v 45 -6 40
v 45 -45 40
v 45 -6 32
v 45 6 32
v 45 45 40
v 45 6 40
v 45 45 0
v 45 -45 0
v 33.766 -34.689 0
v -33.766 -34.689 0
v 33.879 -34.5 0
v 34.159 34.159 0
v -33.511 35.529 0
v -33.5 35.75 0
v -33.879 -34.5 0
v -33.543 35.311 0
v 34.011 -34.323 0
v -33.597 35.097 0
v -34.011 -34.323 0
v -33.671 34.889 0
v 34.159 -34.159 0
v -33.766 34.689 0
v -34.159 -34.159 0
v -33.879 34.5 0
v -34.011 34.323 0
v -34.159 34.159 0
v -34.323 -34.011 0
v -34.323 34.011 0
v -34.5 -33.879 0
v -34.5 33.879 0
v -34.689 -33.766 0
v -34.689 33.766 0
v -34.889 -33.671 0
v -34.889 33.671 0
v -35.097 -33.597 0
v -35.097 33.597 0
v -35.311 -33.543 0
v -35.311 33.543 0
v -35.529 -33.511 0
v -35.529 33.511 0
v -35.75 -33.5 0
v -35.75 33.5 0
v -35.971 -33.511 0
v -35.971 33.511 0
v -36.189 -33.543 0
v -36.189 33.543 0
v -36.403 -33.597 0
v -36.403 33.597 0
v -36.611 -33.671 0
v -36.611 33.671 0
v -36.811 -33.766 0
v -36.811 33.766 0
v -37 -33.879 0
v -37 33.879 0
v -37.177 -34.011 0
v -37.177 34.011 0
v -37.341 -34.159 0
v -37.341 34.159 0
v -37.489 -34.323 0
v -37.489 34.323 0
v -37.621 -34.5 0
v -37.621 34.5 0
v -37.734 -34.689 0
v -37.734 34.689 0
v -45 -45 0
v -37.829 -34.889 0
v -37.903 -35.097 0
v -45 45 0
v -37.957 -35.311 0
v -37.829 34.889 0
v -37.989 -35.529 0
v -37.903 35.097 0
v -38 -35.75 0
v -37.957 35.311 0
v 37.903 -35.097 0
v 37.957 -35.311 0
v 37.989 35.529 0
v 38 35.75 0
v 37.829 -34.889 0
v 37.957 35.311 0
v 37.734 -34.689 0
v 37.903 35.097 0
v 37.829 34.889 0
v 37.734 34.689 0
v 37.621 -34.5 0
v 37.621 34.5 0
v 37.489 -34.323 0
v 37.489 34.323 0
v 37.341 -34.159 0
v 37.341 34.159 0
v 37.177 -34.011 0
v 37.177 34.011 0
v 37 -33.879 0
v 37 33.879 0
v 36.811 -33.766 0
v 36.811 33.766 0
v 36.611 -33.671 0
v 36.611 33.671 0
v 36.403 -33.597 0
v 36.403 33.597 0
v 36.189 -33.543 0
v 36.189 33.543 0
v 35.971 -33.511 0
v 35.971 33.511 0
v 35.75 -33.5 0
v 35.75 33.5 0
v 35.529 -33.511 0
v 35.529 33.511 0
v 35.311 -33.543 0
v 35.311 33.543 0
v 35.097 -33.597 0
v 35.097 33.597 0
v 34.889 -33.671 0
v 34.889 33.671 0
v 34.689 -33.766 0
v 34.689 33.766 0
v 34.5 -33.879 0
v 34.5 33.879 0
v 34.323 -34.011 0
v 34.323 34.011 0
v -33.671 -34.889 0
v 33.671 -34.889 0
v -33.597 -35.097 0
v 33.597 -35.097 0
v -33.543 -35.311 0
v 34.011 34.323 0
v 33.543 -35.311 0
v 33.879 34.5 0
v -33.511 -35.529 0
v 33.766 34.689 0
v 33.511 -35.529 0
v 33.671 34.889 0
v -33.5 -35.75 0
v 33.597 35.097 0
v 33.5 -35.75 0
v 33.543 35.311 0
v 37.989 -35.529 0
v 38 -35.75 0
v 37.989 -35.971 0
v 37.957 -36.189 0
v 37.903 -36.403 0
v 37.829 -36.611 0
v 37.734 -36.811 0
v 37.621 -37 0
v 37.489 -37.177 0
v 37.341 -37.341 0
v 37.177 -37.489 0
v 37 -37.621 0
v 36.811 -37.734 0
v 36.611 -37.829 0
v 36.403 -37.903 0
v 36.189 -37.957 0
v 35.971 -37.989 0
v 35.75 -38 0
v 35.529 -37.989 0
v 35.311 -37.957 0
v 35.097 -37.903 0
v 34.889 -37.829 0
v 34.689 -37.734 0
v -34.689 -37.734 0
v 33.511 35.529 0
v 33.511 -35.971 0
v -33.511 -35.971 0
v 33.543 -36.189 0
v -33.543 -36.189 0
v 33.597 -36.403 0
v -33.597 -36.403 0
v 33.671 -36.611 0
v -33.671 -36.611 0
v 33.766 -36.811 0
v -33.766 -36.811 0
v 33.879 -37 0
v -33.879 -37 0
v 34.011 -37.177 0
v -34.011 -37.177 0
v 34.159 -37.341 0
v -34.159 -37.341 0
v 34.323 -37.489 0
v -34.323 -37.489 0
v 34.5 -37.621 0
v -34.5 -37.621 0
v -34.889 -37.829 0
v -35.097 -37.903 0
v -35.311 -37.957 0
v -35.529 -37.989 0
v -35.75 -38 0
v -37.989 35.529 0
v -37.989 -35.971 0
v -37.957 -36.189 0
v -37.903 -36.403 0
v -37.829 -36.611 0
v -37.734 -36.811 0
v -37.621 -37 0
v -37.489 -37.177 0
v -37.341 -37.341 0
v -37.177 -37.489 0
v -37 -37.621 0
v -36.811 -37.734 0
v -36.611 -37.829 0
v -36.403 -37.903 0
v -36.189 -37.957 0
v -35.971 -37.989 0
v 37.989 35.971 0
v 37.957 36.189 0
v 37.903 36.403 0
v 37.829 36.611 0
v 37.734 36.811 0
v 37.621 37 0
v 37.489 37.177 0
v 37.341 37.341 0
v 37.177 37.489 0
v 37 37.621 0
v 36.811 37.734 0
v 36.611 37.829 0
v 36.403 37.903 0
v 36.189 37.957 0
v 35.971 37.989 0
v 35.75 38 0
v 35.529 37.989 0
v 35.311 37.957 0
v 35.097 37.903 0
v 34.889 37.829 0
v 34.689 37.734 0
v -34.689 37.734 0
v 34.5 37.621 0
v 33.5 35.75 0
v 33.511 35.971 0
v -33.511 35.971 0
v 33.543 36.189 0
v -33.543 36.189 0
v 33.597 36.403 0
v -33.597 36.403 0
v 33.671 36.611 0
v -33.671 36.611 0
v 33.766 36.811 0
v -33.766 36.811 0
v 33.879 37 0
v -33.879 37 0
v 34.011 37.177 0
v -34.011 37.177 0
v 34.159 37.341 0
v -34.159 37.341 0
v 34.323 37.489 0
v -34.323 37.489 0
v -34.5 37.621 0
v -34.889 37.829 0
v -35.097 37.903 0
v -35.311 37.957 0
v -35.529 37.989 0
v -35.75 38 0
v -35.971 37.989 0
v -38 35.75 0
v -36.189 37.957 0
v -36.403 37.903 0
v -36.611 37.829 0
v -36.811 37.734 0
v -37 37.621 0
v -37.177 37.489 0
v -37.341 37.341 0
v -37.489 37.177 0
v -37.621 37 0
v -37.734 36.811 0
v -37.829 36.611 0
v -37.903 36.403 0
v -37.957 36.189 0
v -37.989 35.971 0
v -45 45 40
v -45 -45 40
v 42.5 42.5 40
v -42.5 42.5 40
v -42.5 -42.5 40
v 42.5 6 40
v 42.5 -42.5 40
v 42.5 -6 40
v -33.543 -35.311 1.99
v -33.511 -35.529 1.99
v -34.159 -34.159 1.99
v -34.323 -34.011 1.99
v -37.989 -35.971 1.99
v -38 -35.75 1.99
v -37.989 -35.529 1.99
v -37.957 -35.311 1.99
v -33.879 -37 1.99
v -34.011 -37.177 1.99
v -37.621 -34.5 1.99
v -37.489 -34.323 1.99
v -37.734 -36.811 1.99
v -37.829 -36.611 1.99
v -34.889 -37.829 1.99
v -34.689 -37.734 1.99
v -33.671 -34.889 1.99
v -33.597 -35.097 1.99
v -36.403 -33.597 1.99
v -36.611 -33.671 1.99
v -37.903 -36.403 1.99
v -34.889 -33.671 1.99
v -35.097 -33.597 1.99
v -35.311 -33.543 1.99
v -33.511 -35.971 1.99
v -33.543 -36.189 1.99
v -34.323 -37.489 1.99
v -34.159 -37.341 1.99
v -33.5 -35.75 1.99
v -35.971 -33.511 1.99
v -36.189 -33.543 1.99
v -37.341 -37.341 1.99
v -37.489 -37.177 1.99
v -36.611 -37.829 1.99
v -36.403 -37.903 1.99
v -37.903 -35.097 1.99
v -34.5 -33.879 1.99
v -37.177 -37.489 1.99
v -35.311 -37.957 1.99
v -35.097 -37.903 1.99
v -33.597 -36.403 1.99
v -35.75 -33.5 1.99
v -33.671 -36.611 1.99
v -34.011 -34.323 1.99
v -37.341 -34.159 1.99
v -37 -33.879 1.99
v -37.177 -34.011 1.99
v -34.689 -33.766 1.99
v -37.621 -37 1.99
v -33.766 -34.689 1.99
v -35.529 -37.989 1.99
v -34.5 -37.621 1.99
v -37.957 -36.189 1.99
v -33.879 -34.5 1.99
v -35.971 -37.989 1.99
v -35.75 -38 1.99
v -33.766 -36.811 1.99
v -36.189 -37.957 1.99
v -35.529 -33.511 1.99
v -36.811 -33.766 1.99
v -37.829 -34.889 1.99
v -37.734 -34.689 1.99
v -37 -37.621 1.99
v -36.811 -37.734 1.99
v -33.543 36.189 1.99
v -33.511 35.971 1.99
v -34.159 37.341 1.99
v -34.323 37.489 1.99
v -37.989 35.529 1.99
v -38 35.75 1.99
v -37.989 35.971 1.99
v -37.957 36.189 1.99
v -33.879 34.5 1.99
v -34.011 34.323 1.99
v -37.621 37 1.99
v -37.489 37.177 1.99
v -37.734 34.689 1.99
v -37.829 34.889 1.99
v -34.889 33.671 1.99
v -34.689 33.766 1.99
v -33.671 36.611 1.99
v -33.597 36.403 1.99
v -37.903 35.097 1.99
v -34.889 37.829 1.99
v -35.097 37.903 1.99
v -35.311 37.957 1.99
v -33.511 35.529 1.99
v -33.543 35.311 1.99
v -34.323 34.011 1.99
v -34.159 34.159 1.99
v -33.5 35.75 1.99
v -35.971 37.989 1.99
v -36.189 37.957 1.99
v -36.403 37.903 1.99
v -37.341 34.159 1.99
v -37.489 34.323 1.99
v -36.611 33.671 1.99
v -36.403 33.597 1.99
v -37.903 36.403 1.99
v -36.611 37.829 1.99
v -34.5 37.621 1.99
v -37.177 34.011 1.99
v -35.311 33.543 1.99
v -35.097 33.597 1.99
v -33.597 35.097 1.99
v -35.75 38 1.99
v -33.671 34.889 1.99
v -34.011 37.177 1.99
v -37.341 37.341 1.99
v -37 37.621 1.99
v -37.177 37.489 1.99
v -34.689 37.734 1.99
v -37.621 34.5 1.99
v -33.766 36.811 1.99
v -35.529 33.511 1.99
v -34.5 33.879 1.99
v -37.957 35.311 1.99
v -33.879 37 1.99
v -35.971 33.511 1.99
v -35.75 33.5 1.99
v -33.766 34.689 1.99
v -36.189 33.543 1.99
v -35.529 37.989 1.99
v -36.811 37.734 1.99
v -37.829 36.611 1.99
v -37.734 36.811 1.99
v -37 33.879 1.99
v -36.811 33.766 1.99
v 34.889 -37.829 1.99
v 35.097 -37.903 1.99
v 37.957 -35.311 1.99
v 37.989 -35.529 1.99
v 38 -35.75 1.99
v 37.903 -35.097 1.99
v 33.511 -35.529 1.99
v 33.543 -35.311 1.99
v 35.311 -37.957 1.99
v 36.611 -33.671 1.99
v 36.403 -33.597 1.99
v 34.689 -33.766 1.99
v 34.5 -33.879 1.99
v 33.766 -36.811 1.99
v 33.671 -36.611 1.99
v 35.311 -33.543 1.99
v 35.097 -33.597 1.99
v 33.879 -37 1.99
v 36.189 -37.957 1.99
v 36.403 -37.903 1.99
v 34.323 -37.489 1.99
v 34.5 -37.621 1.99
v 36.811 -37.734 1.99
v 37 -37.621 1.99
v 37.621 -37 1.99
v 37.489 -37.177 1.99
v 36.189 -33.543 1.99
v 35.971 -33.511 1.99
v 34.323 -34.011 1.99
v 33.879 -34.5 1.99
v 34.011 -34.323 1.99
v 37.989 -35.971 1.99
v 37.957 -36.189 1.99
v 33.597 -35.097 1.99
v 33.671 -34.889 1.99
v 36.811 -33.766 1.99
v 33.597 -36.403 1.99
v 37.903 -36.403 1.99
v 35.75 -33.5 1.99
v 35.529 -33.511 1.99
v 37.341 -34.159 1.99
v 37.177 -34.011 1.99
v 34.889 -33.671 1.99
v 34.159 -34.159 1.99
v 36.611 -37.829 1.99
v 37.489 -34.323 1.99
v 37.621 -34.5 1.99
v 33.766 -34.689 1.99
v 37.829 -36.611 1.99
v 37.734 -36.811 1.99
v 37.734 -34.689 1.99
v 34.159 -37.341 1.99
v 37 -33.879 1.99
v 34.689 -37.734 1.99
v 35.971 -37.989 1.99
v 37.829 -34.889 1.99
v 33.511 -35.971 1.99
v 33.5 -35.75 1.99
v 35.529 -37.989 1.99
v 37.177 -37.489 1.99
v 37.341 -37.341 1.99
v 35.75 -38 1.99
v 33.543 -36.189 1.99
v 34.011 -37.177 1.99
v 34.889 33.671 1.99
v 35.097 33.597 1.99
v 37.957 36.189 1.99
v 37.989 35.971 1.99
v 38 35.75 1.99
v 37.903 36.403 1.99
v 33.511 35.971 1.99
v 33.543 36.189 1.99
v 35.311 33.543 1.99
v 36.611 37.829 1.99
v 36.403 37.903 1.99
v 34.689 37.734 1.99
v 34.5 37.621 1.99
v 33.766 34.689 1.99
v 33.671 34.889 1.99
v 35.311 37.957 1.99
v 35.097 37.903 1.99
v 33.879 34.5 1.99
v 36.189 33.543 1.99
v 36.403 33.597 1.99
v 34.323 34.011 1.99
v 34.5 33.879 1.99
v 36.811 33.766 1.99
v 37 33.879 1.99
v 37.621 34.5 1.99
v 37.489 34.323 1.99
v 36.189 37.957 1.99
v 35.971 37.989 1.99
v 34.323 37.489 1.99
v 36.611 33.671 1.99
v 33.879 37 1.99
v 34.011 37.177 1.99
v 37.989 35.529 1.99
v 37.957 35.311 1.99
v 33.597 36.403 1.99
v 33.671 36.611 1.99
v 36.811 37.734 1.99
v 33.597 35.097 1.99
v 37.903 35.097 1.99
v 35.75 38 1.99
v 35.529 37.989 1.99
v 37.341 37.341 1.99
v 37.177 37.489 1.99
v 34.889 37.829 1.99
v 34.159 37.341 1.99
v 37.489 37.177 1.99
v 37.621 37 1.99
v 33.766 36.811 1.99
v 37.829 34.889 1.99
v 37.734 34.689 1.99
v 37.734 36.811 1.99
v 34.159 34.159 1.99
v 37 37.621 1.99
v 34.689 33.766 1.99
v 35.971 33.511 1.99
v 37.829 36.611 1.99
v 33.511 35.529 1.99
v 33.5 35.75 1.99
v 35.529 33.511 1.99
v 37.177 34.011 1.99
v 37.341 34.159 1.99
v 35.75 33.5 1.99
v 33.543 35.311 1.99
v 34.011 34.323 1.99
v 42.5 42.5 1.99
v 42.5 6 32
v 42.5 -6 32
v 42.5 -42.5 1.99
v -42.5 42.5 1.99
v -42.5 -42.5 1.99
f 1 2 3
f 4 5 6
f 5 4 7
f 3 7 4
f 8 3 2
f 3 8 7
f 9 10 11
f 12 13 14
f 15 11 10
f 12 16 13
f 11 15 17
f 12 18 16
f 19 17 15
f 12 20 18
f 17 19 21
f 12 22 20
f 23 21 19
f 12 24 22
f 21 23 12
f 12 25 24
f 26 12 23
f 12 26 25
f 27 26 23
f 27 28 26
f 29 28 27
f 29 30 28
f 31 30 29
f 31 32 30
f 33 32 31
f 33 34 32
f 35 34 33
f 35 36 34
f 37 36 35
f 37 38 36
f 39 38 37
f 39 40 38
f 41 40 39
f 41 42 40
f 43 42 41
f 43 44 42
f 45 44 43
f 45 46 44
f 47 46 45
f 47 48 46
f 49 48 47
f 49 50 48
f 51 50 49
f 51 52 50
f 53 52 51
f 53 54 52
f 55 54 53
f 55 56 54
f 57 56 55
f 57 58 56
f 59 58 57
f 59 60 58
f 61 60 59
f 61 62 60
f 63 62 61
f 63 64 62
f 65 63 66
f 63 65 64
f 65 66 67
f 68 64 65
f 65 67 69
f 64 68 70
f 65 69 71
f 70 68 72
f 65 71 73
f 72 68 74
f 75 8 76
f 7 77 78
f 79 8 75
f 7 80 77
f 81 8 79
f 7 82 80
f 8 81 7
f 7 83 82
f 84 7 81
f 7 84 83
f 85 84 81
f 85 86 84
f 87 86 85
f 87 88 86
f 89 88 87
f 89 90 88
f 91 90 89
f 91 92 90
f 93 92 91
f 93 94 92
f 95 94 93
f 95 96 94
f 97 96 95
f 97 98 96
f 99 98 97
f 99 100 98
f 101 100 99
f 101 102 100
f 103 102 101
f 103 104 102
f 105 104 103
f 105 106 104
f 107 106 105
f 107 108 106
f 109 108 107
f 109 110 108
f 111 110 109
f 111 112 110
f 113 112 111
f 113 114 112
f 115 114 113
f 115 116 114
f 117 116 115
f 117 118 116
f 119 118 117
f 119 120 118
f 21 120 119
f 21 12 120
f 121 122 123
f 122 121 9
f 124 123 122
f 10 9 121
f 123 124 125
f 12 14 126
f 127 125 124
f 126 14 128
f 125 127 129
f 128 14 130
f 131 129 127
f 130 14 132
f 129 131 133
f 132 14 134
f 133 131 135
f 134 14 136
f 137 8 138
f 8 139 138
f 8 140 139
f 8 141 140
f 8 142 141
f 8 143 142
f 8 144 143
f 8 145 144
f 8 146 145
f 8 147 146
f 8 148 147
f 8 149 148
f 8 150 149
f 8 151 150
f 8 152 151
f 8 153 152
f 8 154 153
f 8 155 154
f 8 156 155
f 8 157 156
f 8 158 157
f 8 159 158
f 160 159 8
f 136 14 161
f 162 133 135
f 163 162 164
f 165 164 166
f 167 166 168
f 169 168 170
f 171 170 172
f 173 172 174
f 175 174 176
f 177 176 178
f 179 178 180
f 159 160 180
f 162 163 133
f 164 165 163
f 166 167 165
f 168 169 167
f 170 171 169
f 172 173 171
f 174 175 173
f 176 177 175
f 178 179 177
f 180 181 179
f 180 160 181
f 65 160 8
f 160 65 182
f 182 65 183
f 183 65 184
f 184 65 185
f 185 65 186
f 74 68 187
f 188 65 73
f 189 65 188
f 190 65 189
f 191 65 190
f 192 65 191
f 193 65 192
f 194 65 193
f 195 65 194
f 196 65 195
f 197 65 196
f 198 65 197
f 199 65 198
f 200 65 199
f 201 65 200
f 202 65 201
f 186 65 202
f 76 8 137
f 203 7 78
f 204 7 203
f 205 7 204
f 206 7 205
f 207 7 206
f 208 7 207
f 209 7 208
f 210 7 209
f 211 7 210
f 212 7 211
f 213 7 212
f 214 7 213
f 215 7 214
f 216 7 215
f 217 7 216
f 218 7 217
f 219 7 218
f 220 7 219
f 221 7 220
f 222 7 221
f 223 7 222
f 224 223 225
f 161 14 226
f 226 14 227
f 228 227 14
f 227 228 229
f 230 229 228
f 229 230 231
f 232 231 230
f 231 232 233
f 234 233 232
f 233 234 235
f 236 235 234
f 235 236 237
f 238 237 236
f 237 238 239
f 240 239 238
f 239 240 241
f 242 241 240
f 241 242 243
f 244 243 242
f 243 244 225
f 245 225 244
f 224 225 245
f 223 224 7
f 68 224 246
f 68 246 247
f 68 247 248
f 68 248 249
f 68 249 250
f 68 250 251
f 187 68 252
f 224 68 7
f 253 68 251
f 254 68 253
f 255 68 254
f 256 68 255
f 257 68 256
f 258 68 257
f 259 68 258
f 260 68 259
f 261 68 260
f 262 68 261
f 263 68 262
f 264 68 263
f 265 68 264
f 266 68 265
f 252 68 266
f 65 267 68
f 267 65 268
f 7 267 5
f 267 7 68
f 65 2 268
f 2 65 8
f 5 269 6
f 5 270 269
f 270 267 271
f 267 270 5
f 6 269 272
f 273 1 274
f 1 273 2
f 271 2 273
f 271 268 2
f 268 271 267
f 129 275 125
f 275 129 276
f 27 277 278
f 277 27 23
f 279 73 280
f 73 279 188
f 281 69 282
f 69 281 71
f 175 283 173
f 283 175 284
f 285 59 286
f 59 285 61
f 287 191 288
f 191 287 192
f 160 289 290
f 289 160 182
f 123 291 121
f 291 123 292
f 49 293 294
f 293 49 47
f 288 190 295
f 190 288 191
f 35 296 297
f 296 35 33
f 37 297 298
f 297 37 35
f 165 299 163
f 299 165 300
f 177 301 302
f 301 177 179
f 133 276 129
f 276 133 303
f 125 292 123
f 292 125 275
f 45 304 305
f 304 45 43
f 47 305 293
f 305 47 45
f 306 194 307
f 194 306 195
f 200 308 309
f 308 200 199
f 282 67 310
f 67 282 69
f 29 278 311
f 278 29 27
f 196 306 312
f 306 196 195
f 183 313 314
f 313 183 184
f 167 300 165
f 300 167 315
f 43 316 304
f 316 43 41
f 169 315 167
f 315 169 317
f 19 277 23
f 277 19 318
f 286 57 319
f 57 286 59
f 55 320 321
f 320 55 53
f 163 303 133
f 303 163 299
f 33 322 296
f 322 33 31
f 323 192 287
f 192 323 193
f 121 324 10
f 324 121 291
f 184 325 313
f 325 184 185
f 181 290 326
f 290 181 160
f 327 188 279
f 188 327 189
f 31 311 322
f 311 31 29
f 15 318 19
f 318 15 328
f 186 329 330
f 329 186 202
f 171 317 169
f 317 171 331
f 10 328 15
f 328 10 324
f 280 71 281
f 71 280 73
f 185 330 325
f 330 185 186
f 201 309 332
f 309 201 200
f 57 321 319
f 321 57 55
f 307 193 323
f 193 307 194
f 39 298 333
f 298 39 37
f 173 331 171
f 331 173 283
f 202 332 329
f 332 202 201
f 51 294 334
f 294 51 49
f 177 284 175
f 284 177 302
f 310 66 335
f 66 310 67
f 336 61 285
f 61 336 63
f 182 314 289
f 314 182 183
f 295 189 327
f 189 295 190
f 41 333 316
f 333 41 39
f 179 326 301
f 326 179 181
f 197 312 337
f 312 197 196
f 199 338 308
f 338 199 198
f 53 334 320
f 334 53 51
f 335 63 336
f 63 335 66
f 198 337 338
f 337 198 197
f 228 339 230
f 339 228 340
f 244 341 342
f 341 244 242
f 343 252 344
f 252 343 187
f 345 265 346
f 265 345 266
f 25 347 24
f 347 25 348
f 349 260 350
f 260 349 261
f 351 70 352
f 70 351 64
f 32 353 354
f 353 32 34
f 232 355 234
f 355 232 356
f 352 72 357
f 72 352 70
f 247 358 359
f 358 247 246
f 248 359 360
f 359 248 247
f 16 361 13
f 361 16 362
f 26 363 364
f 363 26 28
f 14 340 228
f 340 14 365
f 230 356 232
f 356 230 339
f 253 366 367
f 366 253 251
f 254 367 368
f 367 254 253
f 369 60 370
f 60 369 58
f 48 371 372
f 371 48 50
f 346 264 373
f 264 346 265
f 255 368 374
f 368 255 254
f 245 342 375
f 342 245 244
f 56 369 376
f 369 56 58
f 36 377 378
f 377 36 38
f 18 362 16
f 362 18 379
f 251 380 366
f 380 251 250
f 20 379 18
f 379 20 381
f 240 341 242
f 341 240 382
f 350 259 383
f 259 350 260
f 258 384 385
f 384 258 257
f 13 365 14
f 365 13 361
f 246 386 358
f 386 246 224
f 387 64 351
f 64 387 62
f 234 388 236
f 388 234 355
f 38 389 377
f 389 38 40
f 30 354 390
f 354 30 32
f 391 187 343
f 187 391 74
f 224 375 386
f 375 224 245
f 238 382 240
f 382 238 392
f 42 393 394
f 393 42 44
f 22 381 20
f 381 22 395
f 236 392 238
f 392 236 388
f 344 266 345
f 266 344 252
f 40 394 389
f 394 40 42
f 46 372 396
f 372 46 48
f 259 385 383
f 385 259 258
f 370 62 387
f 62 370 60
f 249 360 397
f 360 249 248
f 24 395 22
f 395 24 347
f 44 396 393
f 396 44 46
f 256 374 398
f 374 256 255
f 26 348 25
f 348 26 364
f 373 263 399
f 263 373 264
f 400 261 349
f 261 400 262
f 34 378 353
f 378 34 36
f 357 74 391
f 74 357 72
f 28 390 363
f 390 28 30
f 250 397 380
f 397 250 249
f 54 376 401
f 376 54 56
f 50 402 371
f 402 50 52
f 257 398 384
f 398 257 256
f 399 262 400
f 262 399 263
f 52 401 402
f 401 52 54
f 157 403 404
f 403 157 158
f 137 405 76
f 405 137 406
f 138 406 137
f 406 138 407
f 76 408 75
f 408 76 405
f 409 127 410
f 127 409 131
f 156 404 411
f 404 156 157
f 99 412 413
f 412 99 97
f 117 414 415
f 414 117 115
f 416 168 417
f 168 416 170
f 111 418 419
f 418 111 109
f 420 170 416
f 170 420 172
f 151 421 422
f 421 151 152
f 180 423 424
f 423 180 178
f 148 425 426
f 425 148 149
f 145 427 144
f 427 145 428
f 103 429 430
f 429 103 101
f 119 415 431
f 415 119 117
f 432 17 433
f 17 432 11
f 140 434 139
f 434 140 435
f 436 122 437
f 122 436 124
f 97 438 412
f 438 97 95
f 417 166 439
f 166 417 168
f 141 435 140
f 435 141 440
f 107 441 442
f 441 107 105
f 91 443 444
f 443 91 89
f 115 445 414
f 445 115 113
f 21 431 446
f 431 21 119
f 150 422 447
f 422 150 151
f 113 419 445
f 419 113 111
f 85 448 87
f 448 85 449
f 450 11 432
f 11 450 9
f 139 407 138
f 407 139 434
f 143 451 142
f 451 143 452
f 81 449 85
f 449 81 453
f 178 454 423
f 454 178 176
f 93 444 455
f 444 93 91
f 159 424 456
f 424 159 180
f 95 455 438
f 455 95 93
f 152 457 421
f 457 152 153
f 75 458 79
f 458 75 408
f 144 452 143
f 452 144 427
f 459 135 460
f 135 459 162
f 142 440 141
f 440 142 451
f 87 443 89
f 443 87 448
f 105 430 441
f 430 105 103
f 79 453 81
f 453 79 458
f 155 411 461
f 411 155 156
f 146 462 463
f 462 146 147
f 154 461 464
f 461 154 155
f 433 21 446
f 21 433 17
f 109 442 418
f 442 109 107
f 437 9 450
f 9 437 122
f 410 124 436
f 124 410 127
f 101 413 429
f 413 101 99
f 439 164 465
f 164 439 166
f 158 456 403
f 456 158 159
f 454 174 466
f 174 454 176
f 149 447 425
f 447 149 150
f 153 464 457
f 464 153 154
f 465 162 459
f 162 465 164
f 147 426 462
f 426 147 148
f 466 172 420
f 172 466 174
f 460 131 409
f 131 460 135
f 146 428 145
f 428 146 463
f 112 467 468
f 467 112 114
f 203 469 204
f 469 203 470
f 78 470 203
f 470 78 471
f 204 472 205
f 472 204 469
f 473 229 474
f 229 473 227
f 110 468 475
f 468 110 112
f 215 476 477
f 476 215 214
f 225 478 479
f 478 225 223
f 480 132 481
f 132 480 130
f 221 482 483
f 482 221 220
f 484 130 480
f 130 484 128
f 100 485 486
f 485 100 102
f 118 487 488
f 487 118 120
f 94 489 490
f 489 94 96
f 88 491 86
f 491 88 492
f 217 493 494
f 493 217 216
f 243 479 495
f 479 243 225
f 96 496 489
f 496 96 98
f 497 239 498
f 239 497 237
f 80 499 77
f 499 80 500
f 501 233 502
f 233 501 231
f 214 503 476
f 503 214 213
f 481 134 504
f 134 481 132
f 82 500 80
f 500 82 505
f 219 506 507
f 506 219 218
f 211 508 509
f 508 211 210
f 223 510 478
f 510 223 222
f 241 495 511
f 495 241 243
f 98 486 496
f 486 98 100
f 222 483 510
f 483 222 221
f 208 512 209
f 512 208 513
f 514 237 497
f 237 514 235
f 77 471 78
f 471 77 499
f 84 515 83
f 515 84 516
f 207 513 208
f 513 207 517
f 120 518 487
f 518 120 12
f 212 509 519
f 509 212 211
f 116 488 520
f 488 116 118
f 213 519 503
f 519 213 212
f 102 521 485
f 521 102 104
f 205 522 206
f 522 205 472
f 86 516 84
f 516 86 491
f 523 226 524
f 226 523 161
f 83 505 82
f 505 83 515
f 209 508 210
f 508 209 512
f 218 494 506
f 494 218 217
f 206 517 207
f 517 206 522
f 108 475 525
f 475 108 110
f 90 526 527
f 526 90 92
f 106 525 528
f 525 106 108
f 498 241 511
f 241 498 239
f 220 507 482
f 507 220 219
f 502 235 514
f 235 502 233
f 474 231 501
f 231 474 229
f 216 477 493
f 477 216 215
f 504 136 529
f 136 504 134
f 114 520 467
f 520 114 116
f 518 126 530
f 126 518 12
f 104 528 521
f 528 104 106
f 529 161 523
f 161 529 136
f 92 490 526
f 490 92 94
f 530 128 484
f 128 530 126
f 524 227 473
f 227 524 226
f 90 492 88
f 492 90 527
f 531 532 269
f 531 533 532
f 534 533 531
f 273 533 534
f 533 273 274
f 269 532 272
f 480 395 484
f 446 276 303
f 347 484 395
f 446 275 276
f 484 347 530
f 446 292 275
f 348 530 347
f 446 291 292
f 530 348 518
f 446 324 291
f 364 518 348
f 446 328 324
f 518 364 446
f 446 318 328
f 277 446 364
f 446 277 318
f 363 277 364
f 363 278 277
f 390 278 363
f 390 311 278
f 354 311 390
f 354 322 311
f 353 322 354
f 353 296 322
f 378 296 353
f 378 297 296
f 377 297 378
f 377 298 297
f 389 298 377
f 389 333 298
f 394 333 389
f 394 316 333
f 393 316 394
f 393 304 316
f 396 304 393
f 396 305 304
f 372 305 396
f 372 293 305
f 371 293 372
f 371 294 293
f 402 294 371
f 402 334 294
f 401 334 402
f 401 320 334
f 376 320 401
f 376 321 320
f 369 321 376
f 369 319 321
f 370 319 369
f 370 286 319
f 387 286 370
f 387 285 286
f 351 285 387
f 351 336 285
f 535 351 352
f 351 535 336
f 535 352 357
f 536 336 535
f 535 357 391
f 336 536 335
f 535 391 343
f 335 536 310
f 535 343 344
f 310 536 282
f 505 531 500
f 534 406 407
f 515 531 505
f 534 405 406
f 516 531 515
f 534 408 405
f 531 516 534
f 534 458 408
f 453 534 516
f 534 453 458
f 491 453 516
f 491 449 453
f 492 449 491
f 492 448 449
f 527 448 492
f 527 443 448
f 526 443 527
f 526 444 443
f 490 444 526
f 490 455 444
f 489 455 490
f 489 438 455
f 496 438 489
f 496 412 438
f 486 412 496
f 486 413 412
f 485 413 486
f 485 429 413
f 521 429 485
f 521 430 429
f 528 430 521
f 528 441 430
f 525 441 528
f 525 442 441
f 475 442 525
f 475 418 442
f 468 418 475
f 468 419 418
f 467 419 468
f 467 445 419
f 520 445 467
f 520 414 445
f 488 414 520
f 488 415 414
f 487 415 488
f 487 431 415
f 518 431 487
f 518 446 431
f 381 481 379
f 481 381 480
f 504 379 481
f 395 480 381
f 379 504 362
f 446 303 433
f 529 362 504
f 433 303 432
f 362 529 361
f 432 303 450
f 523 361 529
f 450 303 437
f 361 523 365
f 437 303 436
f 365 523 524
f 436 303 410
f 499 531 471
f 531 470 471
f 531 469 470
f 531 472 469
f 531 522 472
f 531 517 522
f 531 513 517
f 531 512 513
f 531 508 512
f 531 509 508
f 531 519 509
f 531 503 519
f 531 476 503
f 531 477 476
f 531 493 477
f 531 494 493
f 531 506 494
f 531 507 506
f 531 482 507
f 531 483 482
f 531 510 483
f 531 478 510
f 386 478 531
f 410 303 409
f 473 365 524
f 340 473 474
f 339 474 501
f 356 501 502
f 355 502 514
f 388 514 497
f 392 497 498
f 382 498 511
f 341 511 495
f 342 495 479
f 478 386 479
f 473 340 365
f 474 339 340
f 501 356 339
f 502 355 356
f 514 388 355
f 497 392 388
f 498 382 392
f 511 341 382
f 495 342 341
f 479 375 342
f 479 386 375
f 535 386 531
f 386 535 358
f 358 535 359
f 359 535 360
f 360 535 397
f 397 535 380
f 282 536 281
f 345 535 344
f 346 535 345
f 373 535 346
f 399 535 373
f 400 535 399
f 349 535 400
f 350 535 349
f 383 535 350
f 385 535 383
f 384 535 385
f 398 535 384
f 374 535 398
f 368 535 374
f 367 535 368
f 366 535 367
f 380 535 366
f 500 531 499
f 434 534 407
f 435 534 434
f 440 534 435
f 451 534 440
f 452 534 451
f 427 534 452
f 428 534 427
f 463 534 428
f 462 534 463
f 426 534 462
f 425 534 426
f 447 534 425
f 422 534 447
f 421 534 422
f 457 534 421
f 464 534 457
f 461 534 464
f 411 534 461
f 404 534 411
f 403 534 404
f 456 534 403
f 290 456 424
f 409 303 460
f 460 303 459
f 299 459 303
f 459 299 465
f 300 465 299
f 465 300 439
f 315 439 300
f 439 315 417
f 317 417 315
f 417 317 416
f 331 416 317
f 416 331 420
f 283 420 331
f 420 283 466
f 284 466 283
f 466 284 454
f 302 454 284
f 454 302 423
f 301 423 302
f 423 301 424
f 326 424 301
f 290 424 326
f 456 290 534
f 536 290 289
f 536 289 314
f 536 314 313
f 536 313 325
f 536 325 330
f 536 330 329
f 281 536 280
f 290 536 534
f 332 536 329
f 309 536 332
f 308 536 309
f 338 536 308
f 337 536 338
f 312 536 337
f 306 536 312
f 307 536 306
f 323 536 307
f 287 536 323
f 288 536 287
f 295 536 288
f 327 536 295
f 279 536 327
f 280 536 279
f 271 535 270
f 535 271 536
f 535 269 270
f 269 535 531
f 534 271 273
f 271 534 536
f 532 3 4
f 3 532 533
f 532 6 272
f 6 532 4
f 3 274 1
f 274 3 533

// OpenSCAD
// --- Dimensions (mm) ---
outer_width = 90;          // Outer width and length of the box
outer_length = 90;         // Outer length and width of the box
wall_thickness = 2.5;       // Thickness of the four vertical walls
top_plate_thickness = 2;    // Thickness of the stirring surface (bottom of the box)
total_height = 40;         // Total height of the housing
screw_hole_diameter = 4.5;  // Diameter for M4 screw holes
screw_pattern_size = 71.5; // Distance between screw holes (center-to-center)
notch_width = 12;          // Width of the cable notch (along the wall)
notch_depth = 2.5;         // Depth of the notch (cuts through the wall thickness)
notch_height = 8;          // Height of the notch (from Z=32 to Z=40)

// --- Constants ---
$fn = 64;

// --- Modeling ---

// The part is printed upside down.
// The top plate (stirring surface) is at Z = 0 to Z = 2.
// The walls rise from Z = 2 to Z = 40.

module stirrer_housing() {
    difference() {
        // 1. The solid outer shell
        union() {
            // The top plate (resting on bed at Z=0)
            cube([outer_width, outer_length, top_plate_thickness]);
            
            // The four walls rising from the top plate
            // We use a hull or a union of cubes to create the walls
            translate([0, 0, top_plate_thickness])
            cube([outer_width, outer_length, total_height - top_plate_thickness]);
        }

        // 2. Hollow out the inside to create the box cavity
        // The cavity starts at the top of the plate (Z = top_plate_thickness)
        // and goes to the top of the box (Z = total_height).
        translate([wall_thickness, wall_thickness, top_plate_thickness - 0.01])
        cube([outer_width - 2 * wall_thickness, outer_length - 2 * wall_thickness, total_height - top_plate_thickness + 0.02]);

        // 3. Screw holes for the fan
        // Pattern is 71.5mm square, centered on the plate.
        // Holes go through the top plate (Z=0 to Z=2).
        for (x = [-screw_pattern_size/2, screw_pattern_size/2]) {
            for (y = [-screw_pattern_size/2, screw_pattern_size/2]) {
                translate([outer_width/2 + x, outer_length/2 + y, -1])
                cylinder(d = screw_hole_diameter, h = top_plate_thickness + 2);
            }
        }

        // 4. Cable notch
        // "In one wall, cut a notch... 12mm wide, centered along the wall, 
        // reaching 8mm down from the open edge (from z=32 to z=40)."
        // The open edge is at Z = 40.
        // The notch is 12mm wide (along Y), 8mm high (along Z), and cuts through the wall.
        // We place it on the wall at X = outer_width.
        // The notch is centered at Y = outer_length/2.
        // The notch height is from Z = 32 to Z = 40.
        translate([outer_width - notch_depth, outer_length/2 - notch_width/2, total_height - notch_height])
        cube([notch_depth + 1, notch_width, notch_height + 0.01]);
    }
}

// Render the part
// Centered on XY plane, resting on Z=0.
translate([-outer_width/2, -outer_length/2, 0])
stirrer_housing();
